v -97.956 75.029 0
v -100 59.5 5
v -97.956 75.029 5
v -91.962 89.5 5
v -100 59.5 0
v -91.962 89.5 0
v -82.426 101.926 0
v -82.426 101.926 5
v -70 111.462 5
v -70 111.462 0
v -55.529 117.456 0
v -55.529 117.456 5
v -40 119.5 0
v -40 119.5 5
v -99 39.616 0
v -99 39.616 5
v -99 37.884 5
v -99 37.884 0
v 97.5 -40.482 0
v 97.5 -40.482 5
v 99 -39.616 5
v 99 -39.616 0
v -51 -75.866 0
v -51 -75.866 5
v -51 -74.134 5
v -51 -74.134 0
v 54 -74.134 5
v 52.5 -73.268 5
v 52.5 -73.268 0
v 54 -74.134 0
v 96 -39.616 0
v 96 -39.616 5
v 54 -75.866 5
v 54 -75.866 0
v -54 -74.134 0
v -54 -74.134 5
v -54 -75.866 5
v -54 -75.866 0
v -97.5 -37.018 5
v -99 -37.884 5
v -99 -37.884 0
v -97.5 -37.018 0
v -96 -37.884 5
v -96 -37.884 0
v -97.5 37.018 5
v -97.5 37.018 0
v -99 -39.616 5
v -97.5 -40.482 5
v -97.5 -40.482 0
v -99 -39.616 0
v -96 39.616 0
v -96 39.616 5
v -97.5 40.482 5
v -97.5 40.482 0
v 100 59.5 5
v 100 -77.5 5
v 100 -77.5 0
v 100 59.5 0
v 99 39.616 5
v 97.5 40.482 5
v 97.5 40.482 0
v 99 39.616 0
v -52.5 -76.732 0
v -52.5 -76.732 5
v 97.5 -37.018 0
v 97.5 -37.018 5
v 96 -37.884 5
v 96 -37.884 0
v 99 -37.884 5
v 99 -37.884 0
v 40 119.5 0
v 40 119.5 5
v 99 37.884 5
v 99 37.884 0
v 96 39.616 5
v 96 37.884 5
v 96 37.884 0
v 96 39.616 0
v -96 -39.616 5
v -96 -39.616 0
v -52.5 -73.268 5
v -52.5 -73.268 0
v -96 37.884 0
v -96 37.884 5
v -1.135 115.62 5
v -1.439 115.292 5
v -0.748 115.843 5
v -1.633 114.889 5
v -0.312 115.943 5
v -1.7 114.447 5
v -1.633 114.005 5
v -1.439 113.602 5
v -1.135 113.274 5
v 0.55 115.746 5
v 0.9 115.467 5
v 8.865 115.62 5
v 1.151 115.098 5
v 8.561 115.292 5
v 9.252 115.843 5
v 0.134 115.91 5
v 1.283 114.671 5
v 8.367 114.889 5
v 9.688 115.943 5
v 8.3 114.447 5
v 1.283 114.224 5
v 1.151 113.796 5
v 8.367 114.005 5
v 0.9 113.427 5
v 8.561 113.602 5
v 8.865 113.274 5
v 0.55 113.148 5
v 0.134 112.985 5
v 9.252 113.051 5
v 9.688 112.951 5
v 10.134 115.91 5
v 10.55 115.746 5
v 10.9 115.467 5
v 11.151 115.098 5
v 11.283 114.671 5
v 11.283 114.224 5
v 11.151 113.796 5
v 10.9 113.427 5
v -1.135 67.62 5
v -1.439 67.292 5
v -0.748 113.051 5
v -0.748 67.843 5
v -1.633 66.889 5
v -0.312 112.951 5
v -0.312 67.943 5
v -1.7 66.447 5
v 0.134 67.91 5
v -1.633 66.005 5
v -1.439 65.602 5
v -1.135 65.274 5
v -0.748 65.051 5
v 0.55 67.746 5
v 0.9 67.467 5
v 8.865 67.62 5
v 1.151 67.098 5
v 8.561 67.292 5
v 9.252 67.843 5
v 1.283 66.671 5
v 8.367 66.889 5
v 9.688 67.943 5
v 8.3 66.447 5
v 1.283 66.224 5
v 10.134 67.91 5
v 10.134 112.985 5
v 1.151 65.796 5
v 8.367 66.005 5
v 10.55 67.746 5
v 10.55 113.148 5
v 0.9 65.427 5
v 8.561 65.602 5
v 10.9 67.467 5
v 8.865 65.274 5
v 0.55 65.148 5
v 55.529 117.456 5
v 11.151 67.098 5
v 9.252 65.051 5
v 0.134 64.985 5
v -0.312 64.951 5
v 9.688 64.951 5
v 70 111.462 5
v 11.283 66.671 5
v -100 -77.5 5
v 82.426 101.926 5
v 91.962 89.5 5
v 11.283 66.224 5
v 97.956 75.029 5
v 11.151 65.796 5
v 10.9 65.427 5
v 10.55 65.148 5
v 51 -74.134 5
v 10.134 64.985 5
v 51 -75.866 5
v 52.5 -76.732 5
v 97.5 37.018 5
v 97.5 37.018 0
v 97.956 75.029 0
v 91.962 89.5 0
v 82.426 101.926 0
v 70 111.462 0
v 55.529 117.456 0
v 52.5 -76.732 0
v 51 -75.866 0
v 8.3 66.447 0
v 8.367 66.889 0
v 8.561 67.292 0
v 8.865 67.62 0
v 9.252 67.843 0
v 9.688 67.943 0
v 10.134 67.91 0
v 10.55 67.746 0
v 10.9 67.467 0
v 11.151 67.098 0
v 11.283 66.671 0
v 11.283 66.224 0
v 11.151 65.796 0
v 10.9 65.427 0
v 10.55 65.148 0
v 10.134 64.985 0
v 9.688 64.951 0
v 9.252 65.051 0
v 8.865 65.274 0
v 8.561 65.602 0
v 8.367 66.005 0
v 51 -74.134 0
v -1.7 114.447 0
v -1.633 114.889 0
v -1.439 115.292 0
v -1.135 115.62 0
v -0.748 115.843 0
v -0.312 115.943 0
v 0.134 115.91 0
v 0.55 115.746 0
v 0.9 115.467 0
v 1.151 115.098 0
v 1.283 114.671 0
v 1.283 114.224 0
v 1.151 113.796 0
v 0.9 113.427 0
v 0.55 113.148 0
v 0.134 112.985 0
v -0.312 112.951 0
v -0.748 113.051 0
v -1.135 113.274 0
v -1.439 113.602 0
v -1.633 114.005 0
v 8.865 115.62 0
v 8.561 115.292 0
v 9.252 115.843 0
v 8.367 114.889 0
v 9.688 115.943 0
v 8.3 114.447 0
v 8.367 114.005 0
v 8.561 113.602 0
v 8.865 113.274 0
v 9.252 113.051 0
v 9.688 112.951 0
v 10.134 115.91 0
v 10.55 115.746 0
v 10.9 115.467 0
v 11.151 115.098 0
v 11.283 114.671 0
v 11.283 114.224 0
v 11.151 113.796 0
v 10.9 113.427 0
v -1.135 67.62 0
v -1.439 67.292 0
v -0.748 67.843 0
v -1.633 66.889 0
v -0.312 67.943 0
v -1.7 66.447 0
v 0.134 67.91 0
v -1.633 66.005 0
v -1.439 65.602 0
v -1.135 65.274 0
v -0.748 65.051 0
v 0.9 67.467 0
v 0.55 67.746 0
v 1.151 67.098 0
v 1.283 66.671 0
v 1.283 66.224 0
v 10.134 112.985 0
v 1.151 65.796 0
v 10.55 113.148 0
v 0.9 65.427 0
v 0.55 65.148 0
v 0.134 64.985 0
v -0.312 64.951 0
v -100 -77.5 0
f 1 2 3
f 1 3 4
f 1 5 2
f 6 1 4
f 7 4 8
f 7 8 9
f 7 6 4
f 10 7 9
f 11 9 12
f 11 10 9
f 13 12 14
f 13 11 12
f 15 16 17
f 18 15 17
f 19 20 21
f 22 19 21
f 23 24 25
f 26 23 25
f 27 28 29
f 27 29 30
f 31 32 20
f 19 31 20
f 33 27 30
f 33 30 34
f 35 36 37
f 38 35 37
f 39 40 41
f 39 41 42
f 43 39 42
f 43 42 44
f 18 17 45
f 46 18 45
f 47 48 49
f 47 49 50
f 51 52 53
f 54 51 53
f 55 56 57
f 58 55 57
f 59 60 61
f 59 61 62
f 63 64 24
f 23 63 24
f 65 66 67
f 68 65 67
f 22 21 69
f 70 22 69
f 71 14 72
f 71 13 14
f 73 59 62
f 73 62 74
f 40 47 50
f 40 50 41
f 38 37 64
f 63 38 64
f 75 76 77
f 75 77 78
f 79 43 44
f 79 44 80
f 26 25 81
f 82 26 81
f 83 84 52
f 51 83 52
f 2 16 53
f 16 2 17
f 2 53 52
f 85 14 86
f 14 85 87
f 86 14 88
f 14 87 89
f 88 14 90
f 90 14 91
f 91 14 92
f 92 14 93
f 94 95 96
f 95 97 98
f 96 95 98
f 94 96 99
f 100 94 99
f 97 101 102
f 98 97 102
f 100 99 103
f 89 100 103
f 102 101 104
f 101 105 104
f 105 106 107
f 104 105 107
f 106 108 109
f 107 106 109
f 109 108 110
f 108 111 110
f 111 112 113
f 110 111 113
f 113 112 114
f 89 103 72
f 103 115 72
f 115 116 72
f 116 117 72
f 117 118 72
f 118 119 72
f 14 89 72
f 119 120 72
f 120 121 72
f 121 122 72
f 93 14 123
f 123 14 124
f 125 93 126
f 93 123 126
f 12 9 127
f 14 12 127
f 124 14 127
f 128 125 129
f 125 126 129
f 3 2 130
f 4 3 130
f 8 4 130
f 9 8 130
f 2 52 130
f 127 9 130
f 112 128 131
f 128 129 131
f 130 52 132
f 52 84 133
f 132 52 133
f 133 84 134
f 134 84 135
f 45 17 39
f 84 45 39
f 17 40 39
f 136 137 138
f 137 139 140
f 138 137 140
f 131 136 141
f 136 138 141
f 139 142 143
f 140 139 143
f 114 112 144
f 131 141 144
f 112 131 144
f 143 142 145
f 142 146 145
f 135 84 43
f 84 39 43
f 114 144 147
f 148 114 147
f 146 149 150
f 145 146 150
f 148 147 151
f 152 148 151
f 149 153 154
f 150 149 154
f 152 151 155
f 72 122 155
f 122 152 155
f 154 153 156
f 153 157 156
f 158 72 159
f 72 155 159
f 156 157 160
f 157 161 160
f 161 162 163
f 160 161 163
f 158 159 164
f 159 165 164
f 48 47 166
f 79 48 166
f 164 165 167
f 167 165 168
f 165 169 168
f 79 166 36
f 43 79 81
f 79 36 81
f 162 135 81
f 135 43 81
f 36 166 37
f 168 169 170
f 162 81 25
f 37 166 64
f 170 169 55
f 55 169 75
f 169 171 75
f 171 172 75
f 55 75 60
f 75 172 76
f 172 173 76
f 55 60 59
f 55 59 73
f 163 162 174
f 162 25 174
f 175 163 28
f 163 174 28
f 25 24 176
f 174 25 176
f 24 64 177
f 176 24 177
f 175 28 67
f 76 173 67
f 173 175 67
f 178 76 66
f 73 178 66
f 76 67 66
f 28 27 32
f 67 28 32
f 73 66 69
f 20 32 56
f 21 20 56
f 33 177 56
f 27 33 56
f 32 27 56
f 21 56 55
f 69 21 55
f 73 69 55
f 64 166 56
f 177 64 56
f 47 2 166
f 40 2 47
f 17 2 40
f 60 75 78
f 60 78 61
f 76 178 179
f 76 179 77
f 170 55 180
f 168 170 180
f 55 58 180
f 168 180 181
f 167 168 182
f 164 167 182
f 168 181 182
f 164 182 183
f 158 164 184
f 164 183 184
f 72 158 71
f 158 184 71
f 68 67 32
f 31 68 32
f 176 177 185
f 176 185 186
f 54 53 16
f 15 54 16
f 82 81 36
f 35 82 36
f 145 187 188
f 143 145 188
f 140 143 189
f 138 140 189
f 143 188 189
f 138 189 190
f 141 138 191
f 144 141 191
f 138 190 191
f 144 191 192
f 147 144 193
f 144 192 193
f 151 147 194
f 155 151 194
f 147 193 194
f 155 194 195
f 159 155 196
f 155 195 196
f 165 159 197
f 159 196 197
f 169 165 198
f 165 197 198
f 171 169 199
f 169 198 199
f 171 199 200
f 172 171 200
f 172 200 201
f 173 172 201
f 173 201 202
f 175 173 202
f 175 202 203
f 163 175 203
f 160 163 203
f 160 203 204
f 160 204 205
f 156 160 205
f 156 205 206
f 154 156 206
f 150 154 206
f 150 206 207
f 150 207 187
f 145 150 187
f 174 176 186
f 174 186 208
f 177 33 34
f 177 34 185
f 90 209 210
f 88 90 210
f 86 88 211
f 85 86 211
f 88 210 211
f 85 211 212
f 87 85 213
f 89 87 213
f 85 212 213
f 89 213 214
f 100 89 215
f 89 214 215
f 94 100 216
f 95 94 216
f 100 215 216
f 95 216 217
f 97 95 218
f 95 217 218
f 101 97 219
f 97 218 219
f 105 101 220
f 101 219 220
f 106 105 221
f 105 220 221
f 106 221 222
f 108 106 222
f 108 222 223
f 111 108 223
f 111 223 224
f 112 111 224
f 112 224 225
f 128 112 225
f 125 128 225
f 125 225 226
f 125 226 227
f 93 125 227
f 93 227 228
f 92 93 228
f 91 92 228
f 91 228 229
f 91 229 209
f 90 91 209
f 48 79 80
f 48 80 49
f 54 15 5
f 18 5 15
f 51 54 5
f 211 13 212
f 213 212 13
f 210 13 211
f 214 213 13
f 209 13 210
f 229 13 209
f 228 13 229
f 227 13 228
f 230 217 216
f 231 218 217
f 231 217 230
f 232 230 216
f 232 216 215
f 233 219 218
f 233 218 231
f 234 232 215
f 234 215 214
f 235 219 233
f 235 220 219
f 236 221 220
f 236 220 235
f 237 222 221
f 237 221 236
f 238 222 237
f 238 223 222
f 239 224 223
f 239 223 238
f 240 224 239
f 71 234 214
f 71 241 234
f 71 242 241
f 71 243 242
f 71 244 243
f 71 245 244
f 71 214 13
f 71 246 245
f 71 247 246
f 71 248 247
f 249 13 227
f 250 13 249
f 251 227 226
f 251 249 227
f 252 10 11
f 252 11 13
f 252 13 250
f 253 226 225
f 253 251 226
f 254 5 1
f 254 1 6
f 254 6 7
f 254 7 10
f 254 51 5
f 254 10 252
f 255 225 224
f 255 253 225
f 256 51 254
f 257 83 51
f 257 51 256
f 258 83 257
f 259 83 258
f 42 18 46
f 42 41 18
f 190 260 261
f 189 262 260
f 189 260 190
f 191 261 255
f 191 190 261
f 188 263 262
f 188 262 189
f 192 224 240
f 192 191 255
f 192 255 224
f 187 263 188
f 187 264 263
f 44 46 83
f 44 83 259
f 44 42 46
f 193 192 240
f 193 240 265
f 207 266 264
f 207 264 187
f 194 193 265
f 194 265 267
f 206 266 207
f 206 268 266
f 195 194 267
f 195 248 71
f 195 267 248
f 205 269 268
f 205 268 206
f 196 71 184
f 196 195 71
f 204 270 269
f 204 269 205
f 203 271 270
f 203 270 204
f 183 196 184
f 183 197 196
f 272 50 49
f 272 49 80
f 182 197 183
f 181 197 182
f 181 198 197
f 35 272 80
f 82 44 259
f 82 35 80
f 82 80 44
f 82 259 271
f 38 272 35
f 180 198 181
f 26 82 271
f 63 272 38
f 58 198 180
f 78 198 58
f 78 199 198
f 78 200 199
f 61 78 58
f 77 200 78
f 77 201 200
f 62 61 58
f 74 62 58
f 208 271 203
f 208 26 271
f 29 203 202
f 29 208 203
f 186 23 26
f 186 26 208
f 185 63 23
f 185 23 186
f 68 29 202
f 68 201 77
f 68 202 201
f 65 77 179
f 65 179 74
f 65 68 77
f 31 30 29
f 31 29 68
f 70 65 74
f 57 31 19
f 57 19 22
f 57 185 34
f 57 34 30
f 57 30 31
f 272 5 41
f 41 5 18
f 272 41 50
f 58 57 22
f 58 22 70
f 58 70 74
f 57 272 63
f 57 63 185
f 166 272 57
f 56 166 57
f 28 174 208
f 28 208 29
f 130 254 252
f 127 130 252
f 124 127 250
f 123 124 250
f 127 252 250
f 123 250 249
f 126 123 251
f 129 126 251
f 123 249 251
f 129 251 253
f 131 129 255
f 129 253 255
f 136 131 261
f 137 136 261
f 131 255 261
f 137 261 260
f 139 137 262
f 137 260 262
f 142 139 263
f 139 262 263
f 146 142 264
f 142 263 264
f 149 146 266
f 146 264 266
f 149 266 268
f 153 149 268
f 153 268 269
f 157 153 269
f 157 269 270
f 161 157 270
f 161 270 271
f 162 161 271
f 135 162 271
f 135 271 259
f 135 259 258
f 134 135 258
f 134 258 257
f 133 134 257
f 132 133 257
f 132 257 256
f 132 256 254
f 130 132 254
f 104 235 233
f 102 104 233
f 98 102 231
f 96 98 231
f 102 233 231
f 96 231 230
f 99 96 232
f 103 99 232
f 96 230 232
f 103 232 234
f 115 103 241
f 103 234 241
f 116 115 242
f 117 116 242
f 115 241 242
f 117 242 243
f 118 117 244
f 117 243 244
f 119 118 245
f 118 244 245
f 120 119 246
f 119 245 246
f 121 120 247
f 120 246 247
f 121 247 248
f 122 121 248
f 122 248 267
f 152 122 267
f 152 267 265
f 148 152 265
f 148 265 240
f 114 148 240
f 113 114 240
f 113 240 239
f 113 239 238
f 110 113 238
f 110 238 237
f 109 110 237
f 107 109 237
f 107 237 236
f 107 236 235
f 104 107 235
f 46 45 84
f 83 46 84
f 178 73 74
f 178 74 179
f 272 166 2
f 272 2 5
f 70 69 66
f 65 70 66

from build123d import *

# Parameters (mm, degrees)
ESQUISSE1_W             = 200
ESQUISSE1_H             = 155
BOSS_EXTRU_1_DEPTH      = 5
ENL_V_MAT_EXTRU_1_DEPTH = 127.614572621
ESQUISSE4_W             = 200
ESQUISSE4_H             = 5
BOSS_EXTRU_2_DEPTH      = 42
CONG_1_R                = 60
ESQUISSE5_R             = 1.5
ENL_V_MAT_EXTRU_2_DEPTH = 17


with BuildPart() as part:
    # Esquisse1 → Boss.-Extru.1 (new body)
    with BuildSketch(Plane.XY):
        Rectangle(ESQUISSE1_W, ESQUISSE1_H)
    extrude(amount=BOSS_EXTRU_1_DEPTH)

    # Esquisse2 → Enlèv. mat.-Extru.1 (cut, through all)
    with BuildSketch(Plane.XY.offset(5)):
        Polygon((-96, 37.883974596), (-96, 39.616025404), (-97.5, 40.482050808), (-99, 39.616025404), (-99, 37.883974596), (-97.5, 37.017949192), align=None)
        Polygon((-97.5, -37.017949192), (-96, -37.883974596), (-96, -39.616025404), (-97.5, -40.482050808), (-99, -39.616025404), (-99, -37.883974596), align=None)
        Polygon((99, -37.883974596), (97.5, -37.017949192), (96, -37.883974596), (96, -39.616025404), (97.5, -40.482050808), (99, -39.616025404), align=None)
        Polygon((97.5, 37.017949192), (96, 37.883974596), (96, 39.616025404), (97.5, 40.482050808), (99, 39.616025404), (99, 37.883974596), align=None)
        Polygon((-51, -75.866025404), (-51, -74.133974596), (-52.5, -73.267949192), (-54, -74.133974596), (-54, -75.866025404), (-52.5, -76.732050808), align=None)
        Polygon((52.5, -76.732050808), (51, -75.866025404), (51, -74.133974596), (52.5, -73.267949192), (54, -74.133974596), (54, -75.866025404), align=None)
    extrude(amount=-ENL_V_MAT_EXTRU_1_DEPTH, mode=Mode.SUBTRACT)

    # Esquisse4 → Boss.-Extru.2 (add)
    with BuildSketch(Plane(origin=(0, 77.5, 0), x_dir=(1, 0, 0), z_dir=(0, 1, 0))):
        with Locations((0, -2.5)):
            Rectangle(ESQUISSE4_W, ESQUISSE4_H)
    extrude(amount=BOSS_EXTRU_2_DEPTH)

    # Congé1
    cong_1_edges = [part.edges().sort_by_distance(p)[0] for p in [
        (100, 119.5, 2.5),
        (-100, 119.5, 2.5),
    ]]
    fillet(cong_1_edges, radius=CONG_1_R)

    # Esquisse5 → Enlèv. mat.-Extru.2 (cut)
    with BuildSketch(Plane(origin=(0, 0, 0), x_dir=(-1, 0, 0), z_dir=(0, 0, -1))):
        with Locations((-9.8, 66.447157523)):
            Circle(ESQUISSE5_R)
        with Locations((0.2, 66.447157523)):
            Circle(ESQUISSE5_R)
        with Locations((-9.8, 114.447157523)):
            Circle(ESQUISSE5_R)
        with Locations((0.2, 114.447157523)):
            Circle(ESQUISSE5_R)
    extrude(amount=-ENL_V_MAT_EXTRU_2_DEPTH, mode=Mode.SUBTRACT)


solid = part.part
